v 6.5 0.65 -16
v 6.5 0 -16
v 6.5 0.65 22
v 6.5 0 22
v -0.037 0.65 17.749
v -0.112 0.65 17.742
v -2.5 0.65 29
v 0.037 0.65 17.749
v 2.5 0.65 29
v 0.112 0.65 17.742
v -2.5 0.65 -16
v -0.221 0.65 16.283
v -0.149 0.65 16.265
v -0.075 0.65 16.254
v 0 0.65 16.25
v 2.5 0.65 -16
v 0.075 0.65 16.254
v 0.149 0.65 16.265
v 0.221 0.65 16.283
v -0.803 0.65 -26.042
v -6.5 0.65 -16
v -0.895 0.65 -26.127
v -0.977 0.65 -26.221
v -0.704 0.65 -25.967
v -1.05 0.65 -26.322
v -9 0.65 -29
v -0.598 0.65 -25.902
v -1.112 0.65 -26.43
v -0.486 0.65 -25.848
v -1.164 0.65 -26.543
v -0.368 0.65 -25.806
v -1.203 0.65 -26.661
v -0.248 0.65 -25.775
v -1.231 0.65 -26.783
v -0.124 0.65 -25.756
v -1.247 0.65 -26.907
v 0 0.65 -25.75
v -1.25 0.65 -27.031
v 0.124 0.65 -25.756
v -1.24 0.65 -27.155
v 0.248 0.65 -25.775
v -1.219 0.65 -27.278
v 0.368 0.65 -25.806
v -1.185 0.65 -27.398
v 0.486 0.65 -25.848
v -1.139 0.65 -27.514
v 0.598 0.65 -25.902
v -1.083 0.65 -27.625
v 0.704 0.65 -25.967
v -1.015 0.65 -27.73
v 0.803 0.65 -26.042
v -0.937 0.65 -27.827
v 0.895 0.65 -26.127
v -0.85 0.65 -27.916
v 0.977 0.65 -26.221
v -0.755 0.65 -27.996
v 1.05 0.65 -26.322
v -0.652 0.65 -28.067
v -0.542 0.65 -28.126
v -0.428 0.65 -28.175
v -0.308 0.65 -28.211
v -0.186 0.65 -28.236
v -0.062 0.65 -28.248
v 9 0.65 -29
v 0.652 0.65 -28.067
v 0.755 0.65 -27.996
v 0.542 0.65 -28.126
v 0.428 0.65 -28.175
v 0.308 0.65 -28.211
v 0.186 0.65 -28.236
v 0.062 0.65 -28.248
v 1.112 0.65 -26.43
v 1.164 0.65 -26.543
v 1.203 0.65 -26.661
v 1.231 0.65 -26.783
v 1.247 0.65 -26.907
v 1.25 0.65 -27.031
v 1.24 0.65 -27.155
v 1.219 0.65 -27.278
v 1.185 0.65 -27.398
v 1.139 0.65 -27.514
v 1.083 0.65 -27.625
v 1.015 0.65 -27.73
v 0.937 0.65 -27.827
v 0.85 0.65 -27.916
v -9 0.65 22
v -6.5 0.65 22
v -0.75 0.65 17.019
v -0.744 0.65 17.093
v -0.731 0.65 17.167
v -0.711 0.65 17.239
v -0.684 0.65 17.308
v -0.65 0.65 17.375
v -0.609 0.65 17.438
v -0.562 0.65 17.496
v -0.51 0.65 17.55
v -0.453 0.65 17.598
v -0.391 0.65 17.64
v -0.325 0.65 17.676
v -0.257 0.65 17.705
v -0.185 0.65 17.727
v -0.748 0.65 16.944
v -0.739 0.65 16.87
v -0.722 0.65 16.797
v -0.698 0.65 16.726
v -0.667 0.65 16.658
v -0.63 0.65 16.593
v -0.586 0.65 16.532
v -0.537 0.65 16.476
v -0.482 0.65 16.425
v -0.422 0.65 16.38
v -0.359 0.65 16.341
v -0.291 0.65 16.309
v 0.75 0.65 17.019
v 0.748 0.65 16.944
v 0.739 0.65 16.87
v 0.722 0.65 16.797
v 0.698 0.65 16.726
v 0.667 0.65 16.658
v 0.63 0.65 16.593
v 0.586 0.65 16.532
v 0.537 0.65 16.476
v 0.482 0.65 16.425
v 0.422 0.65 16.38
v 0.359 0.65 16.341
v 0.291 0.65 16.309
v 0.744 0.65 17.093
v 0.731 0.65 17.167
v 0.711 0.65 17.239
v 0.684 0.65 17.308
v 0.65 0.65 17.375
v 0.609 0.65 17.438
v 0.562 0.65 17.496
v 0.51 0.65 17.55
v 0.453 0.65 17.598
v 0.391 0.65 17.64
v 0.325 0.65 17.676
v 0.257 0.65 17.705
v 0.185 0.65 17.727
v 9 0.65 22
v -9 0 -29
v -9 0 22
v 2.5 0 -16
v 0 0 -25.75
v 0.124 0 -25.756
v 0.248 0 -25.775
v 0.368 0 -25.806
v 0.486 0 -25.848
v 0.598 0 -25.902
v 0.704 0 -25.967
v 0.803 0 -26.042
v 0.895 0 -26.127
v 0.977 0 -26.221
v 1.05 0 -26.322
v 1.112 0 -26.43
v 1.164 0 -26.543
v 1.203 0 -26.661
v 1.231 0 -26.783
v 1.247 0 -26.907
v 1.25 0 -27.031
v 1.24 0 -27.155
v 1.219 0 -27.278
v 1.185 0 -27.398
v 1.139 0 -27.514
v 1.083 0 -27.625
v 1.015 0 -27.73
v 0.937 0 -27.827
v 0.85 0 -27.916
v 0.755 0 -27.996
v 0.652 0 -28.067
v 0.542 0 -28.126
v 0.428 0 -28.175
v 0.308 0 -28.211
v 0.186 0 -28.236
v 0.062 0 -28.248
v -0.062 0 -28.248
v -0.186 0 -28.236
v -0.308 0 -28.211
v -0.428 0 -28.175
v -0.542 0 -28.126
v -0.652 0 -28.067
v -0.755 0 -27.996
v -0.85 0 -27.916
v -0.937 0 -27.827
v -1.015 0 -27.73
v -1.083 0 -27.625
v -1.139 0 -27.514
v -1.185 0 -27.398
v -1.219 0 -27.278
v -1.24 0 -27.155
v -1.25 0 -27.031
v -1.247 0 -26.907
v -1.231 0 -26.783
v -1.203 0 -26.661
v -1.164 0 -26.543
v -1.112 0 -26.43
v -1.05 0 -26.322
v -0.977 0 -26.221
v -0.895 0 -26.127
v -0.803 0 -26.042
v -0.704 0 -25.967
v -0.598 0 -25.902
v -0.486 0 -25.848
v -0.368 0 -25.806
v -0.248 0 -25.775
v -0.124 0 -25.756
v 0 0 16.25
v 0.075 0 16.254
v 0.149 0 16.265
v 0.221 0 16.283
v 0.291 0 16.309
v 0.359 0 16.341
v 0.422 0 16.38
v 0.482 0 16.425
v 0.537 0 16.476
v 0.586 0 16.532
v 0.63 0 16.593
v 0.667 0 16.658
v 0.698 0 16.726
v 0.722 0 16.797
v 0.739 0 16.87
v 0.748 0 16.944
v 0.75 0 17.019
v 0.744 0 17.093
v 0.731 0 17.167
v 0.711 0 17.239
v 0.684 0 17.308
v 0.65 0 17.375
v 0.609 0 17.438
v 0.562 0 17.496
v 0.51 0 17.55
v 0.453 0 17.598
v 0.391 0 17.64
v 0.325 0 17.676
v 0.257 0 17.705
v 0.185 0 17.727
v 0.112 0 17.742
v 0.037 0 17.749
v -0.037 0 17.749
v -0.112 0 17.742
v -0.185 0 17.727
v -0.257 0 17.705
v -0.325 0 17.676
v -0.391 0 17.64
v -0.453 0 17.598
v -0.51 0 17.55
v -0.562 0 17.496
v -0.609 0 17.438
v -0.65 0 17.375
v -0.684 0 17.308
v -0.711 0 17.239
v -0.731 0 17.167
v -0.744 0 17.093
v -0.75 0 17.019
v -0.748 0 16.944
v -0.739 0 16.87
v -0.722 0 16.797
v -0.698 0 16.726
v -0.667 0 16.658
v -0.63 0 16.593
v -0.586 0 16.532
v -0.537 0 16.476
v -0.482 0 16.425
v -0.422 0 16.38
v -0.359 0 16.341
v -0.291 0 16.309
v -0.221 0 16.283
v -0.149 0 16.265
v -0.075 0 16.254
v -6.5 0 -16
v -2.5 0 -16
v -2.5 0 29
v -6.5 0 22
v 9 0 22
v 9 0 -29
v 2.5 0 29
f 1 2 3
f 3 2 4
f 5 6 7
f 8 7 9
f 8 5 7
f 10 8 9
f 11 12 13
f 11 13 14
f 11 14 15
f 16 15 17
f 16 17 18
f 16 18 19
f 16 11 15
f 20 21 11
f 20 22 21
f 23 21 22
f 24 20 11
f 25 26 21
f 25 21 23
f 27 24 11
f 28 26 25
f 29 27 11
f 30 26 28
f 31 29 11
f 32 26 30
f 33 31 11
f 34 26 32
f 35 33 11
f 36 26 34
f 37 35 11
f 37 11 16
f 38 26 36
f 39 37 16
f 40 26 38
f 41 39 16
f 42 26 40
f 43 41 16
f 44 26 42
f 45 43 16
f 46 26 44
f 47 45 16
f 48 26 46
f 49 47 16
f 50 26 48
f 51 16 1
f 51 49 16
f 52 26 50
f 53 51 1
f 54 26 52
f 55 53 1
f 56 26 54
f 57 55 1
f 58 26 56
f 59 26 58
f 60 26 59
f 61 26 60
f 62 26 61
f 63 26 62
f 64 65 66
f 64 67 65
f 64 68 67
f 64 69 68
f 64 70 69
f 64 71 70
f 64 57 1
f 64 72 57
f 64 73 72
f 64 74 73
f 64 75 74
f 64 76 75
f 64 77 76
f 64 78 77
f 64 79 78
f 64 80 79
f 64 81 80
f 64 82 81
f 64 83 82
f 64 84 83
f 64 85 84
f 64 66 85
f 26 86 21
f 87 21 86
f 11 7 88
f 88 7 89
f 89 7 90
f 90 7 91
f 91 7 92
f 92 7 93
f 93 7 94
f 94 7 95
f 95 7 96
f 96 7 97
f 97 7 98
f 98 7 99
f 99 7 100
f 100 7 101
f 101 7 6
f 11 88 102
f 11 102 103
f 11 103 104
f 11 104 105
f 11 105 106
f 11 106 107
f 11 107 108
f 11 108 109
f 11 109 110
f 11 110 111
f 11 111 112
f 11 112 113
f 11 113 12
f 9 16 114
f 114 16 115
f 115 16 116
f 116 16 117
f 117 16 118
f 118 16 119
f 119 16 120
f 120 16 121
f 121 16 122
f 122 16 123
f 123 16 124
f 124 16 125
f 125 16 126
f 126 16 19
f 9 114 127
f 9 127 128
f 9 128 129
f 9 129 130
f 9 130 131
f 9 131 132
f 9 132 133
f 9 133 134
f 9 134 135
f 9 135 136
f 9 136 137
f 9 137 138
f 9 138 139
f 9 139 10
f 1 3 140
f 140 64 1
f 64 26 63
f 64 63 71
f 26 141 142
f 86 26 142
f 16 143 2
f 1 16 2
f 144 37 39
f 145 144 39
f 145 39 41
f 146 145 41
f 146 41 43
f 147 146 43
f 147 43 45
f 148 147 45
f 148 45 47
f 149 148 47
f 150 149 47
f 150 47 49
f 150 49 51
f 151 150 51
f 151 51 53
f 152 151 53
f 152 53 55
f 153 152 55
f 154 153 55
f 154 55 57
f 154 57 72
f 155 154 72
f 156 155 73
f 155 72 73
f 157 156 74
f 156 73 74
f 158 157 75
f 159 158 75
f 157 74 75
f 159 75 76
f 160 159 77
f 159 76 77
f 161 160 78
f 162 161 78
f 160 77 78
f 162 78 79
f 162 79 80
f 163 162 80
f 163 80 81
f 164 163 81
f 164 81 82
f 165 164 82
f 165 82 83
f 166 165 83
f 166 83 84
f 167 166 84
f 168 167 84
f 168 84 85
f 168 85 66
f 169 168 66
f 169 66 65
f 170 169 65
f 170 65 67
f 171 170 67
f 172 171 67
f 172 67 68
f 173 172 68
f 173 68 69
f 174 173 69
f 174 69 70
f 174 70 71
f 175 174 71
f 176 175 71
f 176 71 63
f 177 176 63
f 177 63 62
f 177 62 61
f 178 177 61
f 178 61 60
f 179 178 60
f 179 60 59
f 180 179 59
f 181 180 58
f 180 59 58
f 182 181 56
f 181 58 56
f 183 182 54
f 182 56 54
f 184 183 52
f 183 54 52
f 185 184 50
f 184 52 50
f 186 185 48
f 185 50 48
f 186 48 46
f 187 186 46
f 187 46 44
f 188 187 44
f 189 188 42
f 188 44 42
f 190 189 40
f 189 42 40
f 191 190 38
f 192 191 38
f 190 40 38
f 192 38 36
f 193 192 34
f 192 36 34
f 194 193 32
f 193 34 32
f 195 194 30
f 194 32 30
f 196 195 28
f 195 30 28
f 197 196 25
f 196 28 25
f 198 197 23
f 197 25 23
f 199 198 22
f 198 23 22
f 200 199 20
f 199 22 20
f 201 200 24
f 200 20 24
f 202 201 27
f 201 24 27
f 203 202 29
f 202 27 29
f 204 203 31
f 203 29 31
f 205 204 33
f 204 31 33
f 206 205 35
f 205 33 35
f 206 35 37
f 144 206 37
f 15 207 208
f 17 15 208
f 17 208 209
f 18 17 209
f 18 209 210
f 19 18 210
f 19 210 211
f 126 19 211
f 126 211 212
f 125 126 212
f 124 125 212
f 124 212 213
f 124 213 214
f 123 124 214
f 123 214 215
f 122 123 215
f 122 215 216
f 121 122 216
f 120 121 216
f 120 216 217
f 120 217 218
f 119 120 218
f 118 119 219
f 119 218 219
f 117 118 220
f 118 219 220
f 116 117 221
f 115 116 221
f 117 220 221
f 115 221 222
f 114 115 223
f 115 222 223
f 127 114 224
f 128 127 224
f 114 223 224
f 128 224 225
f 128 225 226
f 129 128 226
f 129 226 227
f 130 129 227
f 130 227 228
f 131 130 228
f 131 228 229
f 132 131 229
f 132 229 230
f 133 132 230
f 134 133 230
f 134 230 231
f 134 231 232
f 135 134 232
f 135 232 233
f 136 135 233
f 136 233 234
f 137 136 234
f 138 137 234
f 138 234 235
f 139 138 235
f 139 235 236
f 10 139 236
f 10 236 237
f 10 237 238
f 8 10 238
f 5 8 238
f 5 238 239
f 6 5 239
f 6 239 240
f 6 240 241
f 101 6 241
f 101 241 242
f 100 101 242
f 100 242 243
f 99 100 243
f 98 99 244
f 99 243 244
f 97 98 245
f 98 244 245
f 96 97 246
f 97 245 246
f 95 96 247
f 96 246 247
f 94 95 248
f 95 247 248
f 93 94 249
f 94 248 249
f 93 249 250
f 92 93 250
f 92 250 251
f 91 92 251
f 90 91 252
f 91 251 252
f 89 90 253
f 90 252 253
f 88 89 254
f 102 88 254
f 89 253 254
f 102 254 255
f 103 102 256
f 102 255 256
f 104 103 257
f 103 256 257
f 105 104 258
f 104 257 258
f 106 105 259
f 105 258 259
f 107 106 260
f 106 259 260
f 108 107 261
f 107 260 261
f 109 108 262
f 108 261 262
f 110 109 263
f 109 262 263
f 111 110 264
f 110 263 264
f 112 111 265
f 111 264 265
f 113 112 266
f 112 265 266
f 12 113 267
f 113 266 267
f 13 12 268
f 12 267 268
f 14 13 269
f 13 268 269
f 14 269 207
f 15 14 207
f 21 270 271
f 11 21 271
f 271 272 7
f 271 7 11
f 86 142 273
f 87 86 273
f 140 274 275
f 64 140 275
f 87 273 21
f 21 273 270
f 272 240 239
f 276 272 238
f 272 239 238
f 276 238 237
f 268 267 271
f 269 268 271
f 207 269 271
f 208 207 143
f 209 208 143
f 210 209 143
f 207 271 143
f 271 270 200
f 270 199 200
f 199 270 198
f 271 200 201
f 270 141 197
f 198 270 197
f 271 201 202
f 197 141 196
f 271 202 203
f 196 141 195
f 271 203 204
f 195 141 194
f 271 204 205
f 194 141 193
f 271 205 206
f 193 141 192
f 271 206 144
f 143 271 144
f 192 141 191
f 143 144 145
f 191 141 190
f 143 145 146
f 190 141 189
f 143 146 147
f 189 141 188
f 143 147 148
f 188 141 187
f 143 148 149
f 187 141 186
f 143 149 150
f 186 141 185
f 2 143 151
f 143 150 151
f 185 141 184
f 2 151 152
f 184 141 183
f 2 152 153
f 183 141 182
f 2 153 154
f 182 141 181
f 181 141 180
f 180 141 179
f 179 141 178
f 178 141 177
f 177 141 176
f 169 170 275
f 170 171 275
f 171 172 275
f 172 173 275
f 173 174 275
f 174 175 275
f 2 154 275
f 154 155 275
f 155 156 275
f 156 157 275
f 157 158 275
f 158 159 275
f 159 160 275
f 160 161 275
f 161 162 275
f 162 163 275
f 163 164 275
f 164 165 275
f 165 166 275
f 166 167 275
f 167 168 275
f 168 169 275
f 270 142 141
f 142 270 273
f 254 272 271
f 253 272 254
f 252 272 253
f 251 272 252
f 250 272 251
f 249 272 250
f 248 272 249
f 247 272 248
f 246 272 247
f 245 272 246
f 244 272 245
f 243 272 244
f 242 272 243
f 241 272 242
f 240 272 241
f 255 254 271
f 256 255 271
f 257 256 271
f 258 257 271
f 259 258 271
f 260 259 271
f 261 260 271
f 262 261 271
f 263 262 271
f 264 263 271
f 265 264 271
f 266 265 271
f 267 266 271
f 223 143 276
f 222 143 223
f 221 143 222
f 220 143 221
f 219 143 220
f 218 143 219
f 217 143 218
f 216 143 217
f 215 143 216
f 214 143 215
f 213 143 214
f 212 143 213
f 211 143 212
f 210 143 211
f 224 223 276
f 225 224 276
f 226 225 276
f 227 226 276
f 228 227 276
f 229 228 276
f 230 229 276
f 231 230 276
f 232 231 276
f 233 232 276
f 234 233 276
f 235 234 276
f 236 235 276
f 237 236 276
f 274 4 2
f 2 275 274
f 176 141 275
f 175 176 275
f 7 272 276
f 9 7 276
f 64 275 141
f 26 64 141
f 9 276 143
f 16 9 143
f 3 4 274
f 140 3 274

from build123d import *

# Parameters (mm, degrees)
SKETCH_1_W          = 5
SKETCH_1_H          = 58
EXTRUDE_1_DEPTH     = 0.65
SKETCH_2_R          = 1.25
CUT_EXTRUDE_1_DEPTH = 10
SKETCH_3_R          = 0.75
CUT_EXTRUDE_2_DEPTH = 10


with BuildPart() as part:
    # 草图1 → 凸台-拉伸1 (new body)
    with BuildSketch(Plane(origin=(0, 0, 0), x_dir=(1, 0, 0), z_dir=(0, 1, 0))):
        Polygon((-2.5, 16), (-2.5, 29), (-9, 29), (-9, -22), (-6.5, -22), (-6.5, 16), align=None)
        Rectangle(SKETCH_1_W, SKETCH_1_H)
        Polygon((9, 29), (2.5, 29), (2.5, 16), (6.5, 16), (6.5, -22), (9, -22), align=None)
    extrude(amount=EXTRUDE_1_DEPTH)

    # 草图2 → 切除-拉伸1 (cut)
    with BuildSketch(Plane(origin=(0, 0.65, 0), x_dir=(1, 0, 0), z_dir=(0, 1, 0))):
        with Locations(Location((0, 27, 0), (0, 0, 270))):
            Circle(SKETCH_2_R)
    extrude(amount=-CUT_EXTRUDE_1_DEPTH, mode=Mode.SUBTRACT)

    # 草图3 → 切除-拉伸2 (cut)
    with BuildSketch(Plane.XZ):
        with Locations(Location((0, 17, 0), (0, 0, 270))):
            Circle(SKETCH_3_R)
    extrude(amount=-CUT_EXTRUDE_2_DEPTH, mode=Mode.SUBTRACT)


solid = part.part
